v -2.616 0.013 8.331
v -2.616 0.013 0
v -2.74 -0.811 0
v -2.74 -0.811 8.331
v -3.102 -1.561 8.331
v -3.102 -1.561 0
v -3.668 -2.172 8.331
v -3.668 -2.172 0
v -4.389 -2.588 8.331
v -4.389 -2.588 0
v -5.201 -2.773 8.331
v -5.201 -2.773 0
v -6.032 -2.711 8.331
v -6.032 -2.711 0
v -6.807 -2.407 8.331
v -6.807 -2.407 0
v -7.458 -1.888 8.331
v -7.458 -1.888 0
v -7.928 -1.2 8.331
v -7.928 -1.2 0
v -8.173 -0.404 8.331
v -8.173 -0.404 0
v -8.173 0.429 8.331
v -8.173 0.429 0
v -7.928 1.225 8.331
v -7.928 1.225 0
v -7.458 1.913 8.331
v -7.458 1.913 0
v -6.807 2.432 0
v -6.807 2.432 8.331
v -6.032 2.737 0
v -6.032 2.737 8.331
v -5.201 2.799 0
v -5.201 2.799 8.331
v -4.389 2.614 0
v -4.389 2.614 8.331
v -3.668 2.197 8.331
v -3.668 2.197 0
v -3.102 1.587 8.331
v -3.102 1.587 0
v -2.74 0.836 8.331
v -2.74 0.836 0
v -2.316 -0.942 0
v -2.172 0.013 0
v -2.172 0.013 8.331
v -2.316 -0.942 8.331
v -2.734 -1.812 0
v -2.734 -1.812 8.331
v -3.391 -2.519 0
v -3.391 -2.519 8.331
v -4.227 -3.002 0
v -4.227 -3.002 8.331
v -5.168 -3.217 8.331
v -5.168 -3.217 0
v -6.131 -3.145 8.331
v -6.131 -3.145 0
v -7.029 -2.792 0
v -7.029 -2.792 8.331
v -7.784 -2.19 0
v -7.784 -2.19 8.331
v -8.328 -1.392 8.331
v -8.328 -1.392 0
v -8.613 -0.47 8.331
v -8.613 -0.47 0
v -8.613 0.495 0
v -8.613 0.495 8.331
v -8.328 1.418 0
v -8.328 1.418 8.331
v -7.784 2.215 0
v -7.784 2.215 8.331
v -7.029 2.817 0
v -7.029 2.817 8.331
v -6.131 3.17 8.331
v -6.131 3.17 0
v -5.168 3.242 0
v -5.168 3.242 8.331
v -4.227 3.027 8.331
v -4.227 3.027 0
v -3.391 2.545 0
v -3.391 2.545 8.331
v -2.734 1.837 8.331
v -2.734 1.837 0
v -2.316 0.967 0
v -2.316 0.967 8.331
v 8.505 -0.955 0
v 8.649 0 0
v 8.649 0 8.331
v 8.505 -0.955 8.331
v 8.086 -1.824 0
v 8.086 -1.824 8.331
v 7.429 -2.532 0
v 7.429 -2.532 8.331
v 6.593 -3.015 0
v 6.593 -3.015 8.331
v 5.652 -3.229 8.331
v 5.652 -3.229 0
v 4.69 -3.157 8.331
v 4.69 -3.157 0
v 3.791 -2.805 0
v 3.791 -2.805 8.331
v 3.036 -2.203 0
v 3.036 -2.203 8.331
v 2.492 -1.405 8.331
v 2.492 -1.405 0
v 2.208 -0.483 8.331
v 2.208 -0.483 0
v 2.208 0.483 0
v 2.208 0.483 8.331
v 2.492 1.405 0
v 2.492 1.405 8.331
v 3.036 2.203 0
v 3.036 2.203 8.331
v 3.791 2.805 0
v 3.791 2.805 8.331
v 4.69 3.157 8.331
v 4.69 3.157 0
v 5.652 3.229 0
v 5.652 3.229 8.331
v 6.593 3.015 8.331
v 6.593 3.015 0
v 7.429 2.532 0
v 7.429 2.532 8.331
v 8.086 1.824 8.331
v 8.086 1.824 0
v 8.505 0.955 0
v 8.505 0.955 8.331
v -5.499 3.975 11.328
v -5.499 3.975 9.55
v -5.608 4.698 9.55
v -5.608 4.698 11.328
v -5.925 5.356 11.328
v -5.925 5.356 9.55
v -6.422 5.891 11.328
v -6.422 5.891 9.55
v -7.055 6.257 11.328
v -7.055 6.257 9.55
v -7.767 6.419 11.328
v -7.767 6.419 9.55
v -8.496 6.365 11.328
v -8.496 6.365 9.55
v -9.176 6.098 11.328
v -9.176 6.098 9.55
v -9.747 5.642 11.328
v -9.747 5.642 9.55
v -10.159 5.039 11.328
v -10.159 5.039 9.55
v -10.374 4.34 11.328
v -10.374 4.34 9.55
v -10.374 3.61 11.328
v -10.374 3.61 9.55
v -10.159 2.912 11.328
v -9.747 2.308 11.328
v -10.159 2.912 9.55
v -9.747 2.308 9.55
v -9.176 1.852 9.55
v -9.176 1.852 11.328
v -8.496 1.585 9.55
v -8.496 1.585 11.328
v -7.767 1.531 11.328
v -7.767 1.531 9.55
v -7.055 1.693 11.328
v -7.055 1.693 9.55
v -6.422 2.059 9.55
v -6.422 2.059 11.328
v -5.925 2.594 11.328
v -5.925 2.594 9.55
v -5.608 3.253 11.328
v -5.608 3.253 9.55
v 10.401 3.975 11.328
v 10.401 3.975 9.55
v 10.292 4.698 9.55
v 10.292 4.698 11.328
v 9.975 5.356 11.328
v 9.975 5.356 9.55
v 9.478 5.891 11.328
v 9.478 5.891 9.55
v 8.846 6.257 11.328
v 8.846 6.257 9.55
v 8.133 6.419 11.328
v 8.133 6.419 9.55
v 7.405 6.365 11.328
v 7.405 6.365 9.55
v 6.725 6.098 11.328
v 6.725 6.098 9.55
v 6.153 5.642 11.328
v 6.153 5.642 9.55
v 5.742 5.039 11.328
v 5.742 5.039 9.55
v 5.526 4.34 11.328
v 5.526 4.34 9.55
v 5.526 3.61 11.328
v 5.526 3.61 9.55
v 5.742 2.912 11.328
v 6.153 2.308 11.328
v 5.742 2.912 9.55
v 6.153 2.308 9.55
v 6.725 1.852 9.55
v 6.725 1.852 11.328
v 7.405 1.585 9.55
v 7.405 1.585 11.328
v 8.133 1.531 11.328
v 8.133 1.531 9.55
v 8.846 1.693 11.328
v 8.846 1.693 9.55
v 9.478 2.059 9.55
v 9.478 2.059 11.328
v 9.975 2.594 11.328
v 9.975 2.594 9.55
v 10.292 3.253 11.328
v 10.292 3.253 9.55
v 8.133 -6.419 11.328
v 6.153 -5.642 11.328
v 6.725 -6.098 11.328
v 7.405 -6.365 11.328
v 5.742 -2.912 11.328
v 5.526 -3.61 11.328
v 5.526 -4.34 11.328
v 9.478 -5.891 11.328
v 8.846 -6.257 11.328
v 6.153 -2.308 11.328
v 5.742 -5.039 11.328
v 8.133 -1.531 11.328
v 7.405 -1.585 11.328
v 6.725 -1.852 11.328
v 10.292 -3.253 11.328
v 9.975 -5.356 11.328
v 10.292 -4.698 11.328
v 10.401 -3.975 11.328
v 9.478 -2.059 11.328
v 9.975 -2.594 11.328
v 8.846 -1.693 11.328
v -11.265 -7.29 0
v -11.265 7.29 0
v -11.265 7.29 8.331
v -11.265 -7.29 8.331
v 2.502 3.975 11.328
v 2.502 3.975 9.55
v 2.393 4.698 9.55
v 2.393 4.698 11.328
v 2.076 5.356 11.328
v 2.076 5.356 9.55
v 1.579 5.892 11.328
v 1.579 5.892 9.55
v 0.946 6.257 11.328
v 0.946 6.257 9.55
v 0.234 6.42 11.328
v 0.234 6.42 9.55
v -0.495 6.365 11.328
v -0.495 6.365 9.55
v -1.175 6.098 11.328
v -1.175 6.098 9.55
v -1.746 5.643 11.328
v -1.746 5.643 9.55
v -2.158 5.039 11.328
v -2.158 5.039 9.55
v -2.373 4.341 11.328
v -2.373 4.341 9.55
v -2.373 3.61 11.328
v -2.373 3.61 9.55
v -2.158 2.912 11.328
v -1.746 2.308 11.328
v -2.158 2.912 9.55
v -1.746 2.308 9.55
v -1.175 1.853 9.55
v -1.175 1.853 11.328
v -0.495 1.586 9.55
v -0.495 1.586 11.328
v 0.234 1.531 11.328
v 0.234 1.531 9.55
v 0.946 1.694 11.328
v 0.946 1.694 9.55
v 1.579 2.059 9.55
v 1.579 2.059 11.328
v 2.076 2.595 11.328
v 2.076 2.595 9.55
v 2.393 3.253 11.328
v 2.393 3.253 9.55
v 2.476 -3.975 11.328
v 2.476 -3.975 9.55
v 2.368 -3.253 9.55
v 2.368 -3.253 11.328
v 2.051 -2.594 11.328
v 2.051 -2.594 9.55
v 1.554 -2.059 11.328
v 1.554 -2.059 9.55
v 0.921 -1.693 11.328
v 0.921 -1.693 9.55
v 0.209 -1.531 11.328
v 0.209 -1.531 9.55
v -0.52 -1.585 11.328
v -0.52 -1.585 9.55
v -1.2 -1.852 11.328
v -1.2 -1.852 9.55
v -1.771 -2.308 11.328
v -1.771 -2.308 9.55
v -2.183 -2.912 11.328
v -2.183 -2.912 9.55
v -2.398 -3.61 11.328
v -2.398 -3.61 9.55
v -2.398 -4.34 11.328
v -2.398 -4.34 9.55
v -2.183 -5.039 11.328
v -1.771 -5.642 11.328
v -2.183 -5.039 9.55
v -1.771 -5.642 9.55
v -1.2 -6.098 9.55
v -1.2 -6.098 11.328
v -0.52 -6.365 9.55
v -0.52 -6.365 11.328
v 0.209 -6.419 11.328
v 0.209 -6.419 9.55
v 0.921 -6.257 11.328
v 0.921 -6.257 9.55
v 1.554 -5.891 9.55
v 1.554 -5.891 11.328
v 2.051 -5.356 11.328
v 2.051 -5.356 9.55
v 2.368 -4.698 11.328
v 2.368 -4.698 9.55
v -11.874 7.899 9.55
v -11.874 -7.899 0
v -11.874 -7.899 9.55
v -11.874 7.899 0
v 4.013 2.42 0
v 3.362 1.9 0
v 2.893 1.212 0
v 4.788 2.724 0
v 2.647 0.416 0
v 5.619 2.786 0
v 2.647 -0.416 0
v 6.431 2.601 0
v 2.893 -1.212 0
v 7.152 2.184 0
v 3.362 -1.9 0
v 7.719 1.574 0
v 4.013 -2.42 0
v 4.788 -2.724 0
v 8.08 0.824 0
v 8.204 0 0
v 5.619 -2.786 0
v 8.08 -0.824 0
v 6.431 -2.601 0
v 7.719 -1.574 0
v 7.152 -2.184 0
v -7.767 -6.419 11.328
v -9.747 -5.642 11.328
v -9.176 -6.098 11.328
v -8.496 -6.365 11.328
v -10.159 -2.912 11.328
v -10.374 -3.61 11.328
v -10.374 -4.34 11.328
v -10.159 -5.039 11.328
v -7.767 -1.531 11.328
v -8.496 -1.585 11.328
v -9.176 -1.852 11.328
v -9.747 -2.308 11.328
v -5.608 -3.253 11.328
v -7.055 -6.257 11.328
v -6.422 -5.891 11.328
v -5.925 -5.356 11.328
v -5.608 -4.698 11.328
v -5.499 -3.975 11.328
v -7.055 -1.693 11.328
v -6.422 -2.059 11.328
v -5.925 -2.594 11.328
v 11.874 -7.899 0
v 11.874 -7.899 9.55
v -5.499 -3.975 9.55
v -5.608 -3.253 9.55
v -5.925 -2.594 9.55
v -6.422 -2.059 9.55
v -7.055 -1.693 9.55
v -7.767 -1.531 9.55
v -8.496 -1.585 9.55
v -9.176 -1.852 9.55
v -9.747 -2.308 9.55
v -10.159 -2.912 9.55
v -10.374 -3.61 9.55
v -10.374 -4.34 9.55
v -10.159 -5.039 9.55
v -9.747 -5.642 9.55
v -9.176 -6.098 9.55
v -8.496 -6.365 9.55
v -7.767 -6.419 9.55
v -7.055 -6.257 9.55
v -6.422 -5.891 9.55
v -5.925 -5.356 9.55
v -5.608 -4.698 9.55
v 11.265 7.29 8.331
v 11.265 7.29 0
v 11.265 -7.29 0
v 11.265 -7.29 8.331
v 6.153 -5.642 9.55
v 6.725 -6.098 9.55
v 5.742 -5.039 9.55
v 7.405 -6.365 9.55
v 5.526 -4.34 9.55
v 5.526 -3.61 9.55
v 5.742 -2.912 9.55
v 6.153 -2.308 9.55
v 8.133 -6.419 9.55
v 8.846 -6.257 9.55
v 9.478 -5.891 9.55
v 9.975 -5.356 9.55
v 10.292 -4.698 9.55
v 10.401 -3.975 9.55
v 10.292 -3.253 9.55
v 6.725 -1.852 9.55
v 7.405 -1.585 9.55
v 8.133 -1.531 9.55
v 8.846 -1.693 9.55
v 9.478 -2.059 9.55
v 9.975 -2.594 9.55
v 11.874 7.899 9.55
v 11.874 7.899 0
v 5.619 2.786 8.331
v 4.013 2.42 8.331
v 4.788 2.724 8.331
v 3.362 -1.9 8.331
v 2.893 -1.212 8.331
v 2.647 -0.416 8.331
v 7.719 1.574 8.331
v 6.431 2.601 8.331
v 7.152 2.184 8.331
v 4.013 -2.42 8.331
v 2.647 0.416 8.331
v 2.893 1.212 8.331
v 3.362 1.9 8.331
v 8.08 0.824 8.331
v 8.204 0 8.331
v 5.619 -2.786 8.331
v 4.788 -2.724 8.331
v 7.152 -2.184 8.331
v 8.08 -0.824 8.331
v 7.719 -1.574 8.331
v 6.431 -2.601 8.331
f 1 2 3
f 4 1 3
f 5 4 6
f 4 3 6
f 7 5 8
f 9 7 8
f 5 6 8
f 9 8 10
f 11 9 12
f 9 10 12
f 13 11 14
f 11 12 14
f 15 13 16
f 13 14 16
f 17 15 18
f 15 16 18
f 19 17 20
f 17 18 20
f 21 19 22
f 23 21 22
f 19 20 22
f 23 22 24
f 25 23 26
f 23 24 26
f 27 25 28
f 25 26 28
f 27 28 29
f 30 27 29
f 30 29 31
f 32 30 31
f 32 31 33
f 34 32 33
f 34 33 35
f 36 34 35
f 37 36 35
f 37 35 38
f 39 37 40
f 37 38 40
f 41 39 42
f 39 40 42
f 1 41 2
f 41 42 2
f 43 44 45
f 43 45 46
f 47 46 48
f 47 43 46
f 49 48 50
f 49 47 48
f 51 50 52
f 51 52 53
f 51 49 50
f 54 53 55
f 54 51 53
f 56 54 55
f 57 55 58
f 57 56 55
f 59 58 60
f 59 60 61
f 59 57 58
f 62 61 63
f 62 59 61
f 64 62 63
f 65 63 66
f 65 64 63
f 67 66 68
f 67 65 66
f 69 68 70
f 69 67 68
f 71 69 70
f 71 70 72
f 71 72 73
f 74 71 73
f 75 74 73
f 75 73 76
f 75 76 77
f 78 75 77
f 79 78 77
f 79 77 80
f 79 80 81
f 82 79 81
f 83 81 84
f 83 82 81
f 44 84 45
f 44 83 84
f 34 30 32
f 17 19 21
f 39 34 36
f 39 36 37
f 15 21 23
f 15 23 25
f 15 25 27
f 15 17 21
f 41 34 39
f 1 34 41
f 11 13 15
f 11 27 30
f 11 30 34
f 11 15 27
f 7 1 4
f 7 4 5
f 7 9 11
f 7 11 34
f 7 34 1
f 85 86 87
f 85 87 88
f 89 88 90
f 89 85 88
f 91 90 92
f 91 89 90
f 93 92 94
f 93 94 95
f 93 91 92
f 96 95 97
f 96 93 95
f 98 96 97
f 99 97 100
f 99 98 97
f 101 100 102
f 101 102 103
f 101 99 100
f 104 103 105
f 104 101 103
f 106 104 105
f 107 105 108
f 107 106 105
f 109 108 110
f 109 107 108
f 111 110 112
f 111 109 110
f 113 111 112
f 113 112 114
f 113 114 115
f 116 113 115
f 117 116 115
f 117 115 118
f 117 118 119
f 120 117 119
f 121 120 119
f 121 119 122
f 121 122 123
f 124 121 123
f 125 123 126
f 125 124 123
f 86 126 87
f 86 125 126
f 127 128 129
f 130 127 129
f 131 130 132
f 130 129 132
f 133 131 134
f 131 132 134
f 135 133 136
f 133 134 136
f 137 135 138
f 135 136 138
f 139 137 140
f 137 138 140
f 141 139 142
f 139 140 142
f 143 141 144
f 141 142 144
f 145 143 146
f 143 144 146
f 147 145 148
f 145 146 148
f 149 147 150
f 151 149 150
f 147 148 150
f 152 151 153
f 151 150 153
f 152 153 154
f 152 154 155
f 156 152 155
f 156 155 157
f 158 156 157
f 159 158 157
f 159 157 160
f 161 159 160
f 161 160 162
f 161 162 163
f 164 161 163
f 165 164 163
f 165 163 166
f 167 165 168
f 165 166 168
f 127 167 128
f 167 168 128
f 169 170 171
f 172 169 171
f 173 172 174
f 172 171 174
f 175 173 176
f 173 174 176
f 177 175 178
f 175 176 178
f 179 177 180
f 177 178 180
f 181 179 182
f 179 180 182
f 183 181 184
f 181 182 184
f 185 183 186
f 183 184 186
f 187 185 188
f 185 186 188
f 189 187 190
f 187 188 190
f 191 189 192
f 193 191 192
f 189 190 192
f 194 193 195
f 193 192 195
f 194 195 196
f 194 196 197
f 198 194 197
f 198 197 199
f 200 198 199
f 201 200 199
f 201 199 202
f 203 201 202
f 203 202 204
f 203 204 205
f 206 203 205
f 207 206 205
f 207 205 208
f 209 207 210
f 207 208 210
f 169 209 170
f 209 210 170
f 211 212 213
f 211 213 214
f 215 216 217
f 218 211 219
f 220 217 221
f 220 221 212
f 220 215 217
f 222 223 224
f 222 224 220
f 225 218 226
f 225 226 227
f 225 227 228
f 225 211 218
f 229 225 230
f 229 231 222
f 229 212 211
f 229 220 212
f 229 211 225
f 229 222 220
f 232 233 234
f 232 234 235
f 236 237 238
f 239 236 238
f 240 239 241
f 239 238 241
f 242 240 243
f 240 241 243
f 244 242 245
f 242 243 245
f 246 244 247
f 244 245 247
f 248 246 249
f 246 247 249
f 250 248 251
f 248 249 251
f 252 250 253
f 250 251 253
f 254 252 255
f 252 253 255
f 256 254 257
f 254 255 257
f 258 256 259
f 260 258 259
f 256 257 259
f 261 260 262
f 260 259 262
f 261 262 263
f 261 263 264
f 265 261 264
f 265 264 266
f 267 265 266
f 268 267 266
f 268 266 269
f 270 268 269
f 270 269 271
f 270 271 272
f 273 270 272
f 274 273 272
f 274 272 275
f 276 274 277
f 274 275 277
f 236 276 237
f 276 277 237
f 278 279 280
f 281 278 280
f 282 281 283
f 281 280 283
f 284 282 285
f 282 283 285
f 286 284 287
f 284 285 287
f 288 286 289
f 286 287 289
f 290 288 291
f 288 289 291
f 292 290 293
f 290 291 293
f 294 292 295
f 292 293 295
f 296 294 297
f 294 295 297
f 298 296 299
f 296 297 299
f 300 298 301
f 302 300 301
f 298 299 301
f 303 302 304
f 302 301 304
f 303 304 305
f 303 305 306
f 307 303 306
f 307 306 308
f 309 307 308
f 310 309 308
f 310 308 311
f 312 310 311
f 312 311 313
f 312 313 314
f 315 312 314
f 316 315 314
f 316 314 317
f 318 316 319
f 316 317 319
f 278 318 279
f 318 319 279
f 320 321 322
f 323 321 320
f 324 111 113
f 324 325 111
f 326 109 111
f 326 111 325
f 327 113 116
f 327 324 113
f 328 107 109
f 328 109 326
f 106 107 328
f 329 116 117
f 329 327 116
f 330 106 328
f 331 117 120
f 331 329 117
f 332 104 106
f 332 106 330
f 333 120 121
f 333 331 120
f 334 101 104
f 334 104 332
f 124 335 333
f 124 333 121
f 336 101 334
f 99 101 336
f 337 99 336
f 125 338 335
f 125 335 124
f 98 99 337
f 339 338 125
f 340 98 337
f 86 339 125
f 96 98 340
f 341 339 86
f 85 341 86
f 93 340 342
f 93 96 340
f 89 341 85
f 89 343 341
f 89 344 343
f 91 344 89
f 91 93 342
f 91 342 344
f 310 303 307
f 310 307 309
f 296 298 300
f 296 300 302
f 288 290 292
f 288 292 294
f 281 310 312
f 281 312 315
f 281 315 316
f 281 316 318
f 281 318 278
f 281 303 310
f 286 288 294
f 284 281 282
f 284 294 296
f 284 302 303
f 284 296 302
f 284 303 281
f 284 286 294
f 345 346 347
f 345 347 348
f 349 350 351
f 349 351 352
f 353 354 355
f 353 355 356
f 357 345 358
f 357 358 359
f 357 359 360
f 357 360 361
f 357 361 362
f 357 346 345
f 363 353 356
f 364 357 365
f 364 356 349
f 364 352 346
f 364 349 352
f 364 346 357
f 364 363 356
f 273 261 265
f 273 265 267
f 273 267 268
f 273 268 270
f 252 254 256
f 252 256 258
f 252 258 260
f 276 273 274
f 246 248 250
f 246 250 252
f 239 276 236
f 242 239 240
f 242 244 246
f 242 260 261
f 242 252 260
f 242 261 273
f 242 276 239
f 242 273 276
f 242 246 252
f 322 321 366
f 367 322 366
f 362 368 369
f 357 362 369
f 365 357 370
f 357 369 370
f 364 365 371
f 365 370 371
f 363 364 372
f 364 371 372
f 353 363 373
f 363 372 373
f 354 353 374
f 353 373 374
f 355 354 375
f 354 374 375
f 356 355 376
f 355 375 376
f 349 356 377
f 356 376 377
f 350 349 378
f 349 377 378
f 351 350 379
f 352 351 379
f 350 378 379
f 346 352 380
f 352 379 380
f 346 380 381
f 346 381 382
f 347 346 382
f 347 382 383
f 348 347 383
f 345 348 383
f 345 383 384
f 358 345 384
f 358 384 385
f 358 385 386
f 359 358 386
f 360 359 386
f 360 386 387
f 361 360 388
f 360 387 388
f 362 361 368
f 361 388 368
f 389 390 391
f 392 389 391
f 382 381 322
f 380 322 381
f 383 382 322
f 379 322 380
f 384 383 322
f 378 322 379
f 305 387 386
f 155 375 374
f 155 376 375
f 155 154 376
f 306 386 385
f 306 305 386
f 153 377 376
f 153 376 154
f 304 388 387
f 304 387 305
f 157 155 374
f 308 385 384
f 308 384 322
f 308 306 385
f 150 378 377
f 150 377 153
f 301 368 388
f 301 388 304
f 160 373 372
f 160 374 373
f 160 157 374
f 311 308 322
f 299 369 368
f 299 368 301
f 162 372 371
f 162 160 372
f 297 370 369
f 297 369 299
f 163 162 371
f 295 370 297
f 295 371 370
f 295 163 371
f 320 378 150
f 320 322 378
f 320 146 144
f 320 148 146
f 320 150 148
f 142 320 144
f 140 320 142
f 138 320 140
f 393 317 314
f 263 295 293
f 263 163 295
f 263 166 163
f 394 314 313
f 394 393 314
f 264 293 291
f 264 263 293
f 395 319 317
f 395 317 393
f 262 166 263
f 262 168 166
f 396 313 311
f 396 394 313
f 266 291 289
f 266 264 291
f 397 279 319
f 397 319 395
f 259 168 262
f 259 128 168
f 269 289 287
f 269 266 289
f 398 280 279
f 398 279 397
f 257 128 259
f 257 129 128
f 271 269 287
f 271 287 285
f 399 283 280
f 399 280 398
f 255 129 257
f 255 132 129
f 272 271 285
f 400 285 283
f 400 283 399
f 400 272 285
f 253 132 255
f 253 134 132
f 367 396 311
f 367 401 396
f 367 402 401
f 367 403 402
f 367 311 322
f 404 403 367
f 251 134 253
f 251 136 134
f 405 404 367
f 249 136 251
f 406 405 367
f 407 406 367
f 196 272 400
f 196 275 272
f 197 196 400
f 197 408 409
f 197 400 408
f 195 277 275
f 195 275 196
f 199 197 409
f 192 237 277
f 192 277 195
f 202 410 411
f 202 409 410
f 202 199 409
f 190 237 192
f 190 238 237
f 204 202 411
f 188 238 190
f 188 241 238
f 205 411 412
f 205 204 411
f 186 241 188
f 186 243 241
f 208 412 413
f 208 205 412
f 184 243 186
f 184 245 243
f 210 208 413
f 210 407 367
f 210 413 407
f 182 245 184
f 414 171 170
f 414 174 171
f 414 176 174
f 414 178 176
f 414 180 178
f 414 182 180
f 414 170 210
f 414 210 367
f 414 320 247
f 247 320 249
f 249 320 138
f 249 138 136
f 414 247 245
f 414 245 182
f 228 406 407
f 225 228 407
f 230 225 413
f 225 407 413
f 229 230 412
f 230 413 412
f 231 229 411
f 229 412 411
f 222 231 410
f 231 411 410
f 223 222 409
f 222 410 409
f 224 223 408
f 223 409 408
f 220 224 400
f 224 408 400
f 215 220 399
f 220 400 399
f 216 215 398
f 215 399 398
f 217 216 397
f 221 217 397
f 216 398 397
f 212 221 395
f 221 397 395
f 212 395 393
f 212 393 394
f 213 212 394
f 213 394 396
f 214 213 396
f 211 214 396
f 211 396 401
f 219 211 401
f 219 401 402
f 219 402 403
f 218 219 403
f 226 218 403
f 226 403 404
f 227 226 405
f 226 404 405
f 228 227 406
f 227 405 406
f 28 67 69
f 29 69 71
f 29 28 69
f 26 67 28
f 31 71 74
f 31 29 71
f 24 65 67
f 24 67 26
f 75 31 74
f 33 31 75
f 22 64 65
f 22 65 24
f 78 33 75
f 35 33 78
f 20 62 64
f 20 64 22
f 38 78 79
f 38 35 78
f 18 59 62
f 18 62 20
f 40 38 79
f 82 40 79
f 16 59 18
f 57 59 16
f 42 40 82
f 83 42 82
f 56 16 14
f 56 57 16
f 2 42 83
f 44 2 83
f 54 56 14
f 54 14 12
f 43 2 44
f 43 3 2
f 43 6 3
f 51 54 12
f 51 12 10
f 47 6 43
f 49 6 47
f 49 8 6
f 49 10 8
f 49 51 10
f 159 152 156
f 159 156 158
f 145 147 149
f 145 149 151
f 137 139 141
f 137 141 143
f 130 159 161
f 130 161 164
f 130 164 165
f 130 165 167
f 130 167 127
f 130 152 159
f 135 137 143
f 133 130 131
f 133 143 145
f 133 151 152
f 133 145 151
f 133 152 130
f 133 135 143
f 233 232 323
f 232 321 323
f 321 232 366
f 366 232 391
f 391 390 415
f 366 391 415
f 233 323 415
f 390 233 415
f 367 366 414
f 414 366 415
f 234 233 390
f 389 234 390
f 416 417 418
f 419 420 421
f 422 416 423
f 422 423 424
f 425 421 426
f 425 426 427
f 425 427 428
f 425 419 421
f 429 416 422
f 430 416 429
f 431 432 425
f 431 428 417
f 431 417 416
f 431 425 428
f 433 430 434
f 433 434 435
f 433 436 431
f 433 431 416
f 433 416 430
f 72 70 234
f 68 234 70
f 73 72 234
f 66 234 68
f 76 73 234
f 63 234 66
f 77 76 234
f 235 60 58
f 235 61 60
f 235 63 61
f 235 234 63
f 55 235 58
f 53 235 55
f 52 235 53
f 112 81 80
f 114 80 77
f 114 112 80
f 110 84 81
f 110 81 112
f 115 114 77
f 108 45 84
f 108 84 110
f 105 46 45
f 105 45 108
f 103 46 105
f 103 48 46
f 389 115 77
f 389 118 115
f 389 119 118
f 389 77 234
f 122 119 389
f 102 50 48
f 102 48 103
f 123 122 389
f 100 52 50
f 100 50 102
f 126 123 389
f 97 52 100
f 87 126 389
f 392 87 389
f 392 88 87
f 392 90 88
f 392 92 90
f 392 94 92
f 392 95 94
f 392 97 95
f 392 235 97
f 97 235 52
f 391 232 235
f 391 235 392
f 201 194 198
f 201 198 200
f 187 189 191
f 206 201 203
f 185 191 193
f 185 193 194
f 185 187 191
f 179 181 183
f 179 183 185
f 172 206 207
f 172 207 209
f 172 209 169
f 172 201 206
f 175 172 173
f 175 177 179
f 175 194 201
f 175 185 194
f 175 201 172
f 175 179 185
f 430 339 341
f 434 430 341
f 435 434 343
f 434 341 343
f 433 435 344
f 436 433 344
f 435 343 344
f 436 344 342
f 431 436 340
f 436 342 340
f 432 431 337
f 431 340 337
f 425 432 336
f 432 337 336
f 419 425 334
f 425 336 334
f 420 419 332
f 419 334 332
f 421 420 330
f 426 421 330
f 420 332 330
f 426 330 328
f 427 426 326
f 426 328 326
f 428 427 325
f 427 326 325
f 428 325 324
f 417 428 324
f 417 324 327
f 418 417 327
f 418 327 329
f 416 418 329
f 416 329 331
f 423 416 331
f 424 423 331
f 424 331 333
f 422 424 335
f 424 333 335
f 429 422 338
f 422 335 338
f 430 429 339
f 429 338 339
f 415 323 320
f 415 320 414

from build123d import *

# Parameters (mm, degrees)
F0_W      = 23.749
F0_H      = 15.7988
F1_DEPTH  = 9.5504
F2_R      = 2.4511
F8_DEPTH  = 1.778
F4_R      = 2.4511
F9_DEPTH  = 1.778
F6_R      = 2.4511
F10_DEPTH = 1.778
F3_R      = 2.4511
F11_DEPTH = 1.778
F5_R      = 2.4511
F12_DEPTH = 1.778
F7_R      = 2.4511
F13_DEPTH = 1.778
F14_W     = 22.5298
F14_H     = 14.5796
F17_DEPTH = 8.3312
F15_R     = 3.2385
F18_DEPTH = 8.3312
F16_R     = 3.2385
F19_DEPTH = 8.3312
F20_R     = 2.794
F22_DEPTH = 8.3312
F21_R     = 2.794
F23_DEPTH = 8.3312


with BuildPart() as f1:
    # F0 (on Top) → F1 (new body)
    with BuildSketch(Plane.XY):
        Rectangle(F0_W, F0_H)
    extrude(amount=F1_DEPTH)

    # F2 (on face) → F8 (join)
    with BuildSketch(Plane.XY.offset(9.5504)):
        with Locations((-7.9502, 3.9751)):
            Circle(F2_R)
    extrude(amount=F8_DEPTH)

    # F4 (on face) → F9 (join)
    with BuildSketch(Plane.XY.offset(9.5504)):
        with Locations((7.9502, 3.9751)):
            Circle(F4_R)
    extrude(amount=F9_DEPTH)

    # F6 (on face) → F10 (join)
    with BuildSketch(Plane.XY.offset(9.5504)):
        with Locations((7.9502, -3.9751)):
            Circle(F6_R)
    extrude(amount=F10_DEPTH)

    # F3 (on face) → F11 (join)
    with BuildSketch(Plane.XY.offset(9.5504)):
        with Locations((0.0508, 3.975429)):
            Circle(F3_R)
    extrude(amount=F11_DEPTH)

    # F5 (on face) → F12 (join)
    with BuildSketch(Plane.XY.offset(9.5504)):
        with Locations((-7.9502, -3.9751)):
            Circle(F5_R)
    extrude(amount=F12_DEPTH)

    # F7 (on face) → F13 (join)
    with BuildSketch(Plane.XY.offset(9.5504)):
        with Locations((0.0254, -3.9751)):
            Circle(F7_R)
    extrude(amount=F13_DEPTH)

    # F14 (on face) → F17 (cut)
    with BuildSketch(Plane(origin=(0, 0, 0), x_dir=(1, 0, 0), z_dir=(0, 0, -1))):
        Rectangle(F14_W, F14_H)
    extrude(amount=-F17_DEPTH, mode=Mode.SUBTRACT)

    # F15 (on face) → F18 (join)
    with BuildSketch(Plane(origin=(0, 0, 0), x_dir=(1, 0, 0), z_dir=(0, 0, -1))):
        with Locations((-5.4102, -0.0127)):
            Circle(F15_R)
    extrude(amount=-F18_DEPTH)

    # F16 (on face) → F19 (join)
    with BuildSketch(Plane(origin=(0, 0, 0), x_dir=(1, 0, 0), z_dir=(0, 0, -1))):
        with Locations((5.4102, 0)):
            Circle(F16_R)
    extrude(amount=-F19_DEPTH)

    # F20 (on face) → F22 (cut)
    with BuildSketch(Plane(origin=(0, 0, 0), x_dir=(1, 0, 0), z_dir=(0, 0, -1))):
        with Locations((-5.4102, -0.0127)):
            Circle(F20_R)
    extrude(amount=-F22_DEPTH, mode=Mode.SUBTRACT)

    # F21 (on face) → F23 (cut)
    with BuildSketch(Plane(origin=(0, 0, 0), x_dir=(1, 0, 0), z_dir=(0, 0, -1))):
        with Locations((5.4102, 0)):
            Circle(F21_R)
    extrude(amount=-F23_DEPTH, mode=Mode.SUBTRACT)


solid = f1.part
